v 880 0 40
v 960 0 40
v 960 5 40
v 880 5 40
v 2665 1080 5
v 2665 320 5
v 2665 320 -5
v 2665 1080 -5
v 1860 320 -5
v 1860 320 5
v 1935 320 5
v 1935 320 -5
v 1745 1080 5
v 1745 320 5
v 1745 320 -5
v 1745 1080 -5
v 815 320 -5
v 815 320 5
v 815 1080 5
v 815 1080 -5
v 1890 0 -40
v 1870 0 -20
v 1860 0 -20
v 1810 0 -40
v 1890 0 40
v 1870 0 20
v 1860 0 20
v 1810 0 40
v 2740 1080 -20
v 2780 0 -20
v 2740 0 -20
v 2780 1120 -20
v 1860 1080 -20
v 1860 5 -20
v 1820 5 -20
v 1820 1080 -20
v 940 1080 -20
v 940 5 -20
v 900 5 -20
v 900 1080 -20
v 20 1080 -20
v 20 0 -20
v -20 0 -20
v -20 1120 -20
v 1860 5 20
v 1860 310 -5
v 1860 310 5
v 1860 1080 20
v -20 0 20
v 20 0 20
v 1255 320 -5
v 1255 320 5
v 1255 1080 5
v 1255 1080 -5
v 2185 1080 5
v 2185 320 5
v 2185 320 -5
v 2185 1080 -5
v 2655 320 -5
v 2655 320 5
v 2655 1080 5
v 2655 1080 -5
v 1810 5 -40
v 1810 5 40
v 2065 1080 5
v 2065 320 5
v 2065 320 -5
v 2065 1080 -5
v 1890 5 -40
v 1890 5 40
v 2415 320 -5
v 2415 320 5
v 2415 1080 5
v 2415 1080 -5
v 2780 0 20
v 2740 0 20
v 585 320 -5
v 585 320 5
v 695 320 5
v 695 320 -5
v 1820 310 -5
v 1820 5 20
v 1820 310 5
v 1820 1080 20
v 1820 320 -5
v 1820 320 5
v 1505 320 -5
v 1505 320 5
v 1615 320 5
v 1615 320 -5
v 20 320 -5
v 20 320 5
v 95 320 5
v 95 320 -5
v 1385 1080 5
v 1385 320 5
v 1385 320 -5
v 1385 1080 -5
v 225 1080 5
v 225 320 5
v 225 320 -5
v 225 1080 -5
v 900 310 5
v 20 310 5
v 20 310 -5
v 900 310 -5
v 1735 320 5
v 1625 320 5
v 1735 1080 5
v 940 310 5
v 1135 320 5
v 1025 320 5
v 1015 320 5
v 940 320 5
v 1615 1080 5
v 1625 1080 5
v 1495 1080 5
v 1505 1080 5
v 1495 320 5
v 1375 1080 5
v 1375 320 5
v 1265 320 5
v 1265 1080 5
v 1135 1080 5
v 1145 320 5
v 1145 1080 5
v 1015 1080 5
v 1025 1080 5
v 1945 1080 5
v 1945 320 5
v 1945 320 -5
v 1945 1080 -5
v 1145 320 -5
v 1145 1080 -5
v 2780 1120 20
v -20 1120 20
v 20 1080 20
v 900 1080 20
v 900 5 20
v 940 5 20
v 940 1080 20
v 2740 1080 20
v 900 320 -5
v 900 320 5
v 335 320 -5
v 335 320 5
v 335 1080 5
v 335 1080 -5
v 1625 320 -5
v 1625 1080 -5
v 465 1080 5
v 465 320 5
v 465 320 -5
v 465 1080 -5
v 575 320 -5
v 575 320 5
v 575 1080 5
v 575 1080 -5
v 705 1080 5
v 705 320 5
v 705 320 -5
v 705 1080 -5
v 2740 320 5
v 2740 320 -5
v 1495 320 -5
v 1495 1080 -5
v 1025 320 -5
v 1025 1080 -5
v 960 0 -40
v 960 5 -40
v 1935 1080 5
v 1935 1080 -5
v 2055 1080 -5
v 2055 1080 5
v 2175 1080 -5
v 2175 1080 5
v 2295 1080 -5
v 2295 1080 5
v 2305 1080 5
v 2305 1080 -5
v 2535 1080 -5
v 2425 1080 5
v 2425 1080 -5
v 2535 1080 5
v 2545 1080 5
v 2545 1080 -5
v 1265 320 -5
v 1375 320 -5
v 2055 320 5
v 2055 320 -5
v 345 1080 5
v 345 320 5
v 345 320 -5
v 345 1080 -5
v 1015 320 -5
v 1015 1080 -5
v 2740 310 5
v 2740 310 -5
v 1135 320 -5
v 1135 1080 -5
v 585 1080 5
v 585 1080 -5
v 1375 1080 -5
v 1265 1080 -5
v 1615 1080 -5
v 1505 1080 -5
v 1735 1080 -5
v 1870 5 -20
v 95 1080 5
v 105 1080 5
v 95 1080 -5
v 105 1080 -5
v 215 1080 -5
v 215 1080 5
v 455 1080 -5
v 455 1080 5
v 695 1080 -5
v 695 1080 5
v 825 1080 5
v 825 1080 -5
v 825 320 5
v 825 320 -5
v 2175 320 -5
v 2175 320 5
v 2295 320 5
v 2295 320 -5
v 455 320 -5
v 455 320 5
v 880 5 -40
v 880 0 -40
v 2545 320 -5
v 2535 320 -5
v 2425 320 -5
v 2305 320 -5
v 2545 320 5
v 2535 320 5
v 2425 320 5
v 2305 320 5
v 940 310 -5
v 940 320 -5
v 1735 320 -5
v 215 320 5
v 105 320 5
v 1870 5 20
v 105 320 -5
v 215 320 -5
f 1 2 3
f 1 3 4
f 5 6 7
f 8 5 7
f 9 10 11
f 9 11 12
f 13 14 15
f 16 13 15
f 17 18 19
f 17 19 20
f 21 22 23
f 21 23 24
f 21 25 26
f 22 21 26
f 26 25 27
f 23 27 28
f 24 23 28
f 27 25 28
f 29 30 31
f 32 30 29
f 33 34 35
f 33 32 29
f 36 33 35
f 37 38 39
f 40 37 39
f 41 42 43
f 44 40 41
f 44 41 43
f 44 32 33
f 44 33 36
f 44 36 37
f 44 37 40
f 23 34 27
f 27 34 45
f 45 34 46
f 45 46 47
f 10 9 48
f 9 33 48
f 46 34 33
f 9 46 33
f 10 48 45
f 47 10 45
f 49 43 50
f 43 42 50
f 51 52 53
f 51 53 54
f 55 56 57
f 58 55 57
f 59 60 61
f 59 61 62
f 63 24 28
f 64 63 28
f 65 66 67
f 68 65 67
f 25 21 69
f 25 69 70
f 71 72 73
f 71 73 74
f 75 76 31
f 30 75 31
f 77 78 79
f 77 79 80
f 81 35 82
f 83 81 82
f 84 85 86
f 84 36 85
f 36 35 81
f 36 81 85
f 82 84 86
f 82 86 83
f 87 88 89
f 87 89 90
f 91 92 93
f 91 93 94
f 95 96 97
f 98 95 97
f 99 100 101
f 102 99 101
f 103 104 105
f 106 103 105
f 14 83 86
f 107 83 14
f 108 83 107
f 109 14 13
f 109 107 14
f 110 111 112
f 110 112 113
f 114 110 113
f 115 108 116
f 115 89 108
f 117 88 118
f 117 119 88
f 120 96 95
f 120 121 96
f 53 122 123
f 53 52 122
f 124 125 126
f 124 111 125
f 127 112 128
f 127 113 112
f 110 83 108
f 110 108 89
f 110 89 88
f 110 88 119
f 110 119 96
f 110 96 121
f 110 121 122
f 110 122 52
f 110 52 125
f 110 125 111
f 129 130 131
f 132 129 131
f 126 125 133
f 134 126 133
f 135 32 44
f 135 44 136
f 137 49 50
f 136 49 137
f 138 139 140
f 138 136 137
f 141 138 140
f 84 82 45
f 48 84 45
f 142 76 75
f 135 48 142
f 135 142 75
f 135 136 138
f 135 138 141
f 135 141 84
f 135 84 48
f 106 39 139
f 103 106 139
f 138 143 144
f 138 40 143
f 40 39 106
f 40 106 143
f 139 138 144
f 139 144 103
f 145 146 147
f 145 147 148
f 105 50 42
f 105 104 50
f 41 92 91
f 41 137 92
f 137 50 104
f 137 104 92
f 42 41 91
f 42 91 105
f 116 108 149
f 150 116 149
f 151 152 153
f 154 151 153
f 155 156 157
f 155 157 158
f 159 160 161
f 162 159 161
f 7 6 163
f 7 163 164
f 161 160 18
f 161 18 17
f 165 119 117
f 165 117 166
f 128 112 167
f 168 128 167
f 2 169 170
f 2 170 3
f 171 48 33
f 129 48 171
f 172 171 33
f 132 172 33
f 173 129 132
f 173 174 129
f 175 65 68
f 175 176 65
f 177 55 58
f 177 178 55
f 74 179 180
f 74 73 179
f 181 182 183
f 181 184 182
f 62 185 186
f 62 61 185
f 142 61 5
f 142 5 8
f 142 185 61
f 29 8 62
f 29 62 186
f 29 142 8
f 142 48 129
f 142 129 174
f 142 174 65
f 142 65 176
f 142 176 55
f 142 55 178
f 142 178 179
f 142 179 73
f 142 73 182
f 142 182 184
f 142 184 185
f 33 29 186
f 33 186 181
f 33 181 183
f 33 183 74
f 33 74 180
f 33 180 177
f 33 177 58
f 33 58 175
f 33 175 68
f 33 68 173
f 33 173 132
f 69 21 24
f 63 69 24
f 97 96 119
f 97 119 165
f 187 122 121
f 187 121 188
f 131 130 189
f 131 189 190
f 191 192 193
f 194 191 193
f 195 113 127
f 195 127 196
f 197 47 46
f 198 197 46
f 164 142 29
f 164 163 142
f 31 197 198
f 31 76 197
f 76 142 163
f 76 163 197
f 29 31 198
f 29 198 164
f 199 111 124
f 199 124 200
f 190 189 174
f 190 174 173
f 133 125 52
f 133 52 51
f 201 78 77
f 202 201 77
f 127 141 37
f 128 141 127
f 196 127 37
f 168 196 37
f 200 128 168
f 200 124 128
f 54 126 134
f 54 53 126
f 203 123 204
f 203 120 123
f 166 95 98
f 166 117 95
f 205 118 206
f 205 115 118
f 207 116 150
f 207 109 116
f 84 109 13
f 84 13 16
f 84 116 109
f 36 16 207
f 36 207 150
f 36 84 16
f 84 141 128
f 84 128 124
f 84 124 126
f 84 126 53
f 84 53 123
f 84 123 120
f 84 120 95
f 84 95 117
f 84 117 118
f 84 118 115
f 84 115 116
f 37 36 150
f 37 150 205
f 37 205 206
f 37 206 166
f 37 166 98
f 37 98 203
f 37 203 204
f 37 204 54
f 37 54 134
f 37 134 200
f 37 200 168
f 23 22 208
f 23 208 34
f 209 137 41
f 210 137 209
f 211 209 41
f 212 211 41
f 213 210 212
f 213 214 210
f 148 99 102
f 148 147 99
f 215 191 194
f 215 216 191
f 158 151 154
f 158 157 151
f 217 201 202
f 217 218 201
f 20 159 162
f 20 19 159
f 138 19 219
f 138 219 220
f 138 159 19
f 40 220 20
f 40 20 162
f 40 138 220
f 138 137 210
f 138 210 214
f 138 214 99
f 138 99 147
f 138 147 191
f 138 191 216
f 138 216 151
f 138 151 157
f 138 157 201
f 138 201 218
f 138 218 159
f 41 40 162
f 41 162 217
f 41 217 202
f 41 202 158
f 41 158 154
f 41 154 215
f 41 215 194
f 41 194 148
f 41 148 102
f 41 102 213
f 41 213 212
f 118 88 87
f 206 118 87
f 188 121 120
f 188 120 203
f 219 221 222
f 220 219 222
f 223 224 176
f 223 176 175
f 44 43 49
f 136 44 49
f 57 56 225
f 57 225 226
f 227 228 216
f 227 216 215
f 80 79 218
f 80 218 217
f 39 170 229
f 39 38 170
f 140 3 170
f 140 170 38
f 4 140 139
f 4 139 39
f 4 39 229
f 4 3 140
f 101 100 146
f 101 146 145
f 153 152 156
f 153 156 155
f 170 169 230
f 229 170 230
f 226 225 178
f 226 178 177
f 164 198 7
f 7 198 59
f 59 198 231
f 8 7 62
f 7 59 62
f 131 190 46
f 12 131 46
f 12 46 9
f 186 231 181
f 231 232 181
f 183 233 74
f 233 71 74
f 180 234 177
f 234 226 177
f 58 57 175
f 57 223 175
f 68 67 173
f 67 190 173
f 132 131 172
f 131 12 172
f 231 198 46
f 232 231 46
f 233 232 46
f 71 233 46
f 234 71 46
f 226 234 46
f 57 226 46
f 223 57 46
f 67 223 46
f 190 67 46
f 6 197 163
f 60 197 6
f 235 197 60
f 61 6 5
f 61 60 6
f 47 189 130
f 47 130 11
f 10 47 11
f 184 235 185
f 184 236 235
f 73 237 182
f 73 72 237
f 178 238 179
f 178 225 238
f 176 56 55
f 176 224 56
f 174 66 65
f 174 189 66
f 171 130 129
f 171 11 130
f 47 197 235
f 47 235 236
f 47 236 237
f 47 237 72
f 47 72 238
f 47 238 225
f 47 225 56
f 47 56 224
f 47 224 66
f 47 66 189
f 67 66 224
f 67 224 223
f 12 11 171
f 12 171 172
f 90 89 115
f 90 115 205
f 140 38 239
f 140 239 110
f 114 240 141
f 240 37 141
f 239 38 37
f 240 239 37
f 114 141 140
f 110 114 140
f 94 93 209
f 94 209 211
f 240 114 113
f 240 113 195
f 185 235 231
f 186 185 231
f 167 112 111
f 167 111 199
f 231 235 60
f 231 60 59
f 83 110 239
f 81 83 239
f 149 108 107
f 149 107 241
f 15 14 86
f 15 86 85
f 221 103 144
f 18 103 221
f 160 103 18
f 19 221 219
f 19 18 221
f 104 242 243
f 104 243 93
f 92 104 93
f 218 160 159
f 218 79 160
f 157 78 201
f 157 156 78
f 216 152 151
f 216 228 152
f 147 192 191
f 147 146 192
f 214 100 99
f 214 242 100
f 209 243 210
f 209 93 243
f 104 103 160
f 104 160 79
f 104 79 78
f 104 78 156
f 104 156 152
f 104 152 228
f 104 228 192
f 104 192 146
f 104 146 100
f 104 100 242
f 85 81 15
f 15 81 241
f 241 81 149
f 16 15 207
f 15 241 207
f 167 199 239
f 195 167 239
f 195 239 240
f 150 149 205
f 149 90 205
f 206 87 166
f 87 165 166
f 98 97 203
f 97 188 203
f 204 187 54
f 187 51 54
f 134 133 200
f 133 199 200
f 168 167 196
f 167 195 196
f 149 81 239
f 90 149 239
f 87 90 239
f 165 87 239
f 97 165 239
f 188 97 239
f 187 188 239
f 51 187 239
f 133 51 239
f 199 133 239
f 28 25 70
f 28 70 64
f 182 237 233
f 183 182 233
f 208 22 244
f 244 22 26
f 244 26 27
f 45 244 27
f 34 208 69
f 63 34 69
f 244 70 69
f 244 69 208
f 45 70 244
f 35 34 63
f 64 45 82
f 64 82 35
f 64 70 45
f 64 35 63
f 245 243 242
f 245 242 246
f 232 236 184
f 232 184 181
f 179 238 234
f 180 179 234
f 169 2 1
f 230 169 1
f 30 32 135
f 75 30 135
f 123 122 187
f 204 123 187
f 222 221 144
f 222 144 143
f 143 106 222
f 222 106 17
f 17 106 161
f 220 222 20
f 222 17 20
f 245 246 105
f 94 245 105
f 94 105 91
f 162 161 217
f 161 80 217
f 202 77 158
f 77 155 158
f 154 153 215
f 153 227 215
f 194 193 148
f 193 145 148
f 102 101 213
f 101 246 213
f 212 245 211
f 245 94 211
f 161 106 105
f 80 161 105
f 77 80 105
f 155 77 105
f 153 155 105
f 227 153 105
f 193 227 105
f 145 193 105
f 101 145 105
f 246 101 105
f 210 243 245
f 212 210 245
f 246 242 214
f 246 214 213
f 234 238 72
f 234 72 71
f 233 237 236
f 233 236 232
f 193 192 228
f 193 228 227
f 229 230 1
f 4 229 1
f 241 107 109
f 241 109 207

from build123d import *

# Parameters (mm, degrees)
SKETCH_2_W                           = 40
SKETCH_2_H                           = 40
SKETCH_4_W                           = 40
SKETCH_4_H                           = 40
EXTRUDE_1_DEPTH                      = 1080
EXTRUDE_2_REACH                      = 2980.657
SKETCH_5_W                           = 10
SKETCH_5_H                           = 10
SKETCH_6_W                           = 10
SKETCH_6_H                           = 10
EXTRUDE_3_DEPTH                      = 760
PATTERN_LINEAR_2_COUNT               = 4
PATTERN_LINEAR_2_PITCH               = 120
PATTERN_LINEAR_2_COL_COUNT           = 4
PATTERN_LINEAR_2_COL_PITCH           = 120
PATTERN_LINEAR_3_COUNT               = 2
PATTERN_LINEAR_3_PITCH               = 920
PATTERN_LINEAR_3_COPY_1_SKETCH_W     = 10
PATTERN_LINEAR_3_COPY_1_SKETCH_H     = 10
PATTERN_LINEAR_3_COPY_1_DEPTH        = 760
PATTERN_LINEAR_3_COPY_2_SKETCH_W     = 10
PATTERN_LINEAR_3_COPY_2_SKETCH_H     = 10
PATTERN_LINEAR_3_COPY_2_DEPTH        = 760
PATTERN_LINEAR_3_COPY_3_SKETCH_W     = 10
PATTERN_LINEAR_3_COPY_3_SKETCH_H     = 10
PATTERN_LINEAR_3_COPY_3_DEPTH        = 760
PATTERN_LINEAR_3_COPY_4_SKETCH_W     = 10
PATTERN_LINEAR_3_COPY_4_SKETCH_H     = 10
PATTERN_LINEAR_3_COPY_4_DEPTH        = 760
PATTERN_LINEAR_3_COPY_5_SKETCH_W     = 10
PATTERN_LINEAR_3_COPY_5_SKETCH_H     = 10
PATTERN_LINEAR_3_COPY_5_DEPTH        = 760
PATTERN_LINEAR_3_COPY_6_SKETCH_W     = 10
PATTERN_LINEAR_3_COPY_6_SKETCH_H     = 10
PATTERN_LINEAR_3_COPY_6_DEPTH        = 760
PATTERN_LINEAR_3_COL_COUNT           = 2
PATTERN_LINEAR_3_COL_PITCH           = 920
PATTERN_LINEAR_3_COL_COPY_1_SKETCH_W = 10
PATTERN_LINEAR_3_COL_COPY_1_SKETCH_H = 10
PATTERN_LINEAR_3_COL_COPY_1_DEPTH    = 760
PATTERN_LINEAR_3_COL_COPY_2_SKETCH_W = 10
PATTERN_LINEAR_3_COL_COPY_2_SKETCH_H = 10
PATTERN_LINEAR_3_COL_COPY_2_DEPTH    = 760
PATTERN_LINEAR_3_COL_COPY_3_SKETCH_W = 10
PATTERN_LINEAR_3_COL_COPY_3_SKETCH_H = 10
PATTERN_LINEAR_3_COL_COPY_3_DEPTH    = 760
PATTERN_LINEAR_3_COL_COPY_4_SKETCH_W = 10
PATTERN_LINEAR_3_COL_COPY_4_SKETCH_H = 10
PATTERN_LINEAR_3_COL_COPY_4_DEPTH    = 760
PATTERN_LINEAR_3_COL_COPY_5_SKETCH_W = 10
PATTERN_LINEAR_3_COL_COPY_5_SKETCH_H = 10
PATTERN_LINEAR_3_COL_COPY_5_DEPTH    = 760
PATTERN_LINEAR_3_COL_COPY_6_SKETCH_W = 10
PATTERN_LINEAR_3_COL_COPY_6_SKETCH_H = 10
PATTERN_LINEAR_3_COL_COPY_6_DEPTH    = 760
SKETCH_7_W                           = 80
SKETCH_7_H                           = 80
SKETCH_7_W_2                         = 40
SKETCH_7_H_2                         = 40
EXTRUDE_4_DEPTH                      = 5
PATTERN_LINEAR_4_COUNT               = 2
PATTERN_LINEAR_4_PITCH               = 930


with BuildPart() as part:
    # По траектории2: sweep along a curve in space
    with BuildLine() as sweep_2_path:
        Line((0, 0, 0), (0, 1100, 0))
        Line((0, 1100, 0), (2760, 1100, 0))
        Line((2760, 1100, 0), (2760, 0, 0))
    # Эскиз2 → По траектории2 (sweep)
    with BuildSketch(Plane(origin=(0, 0, 0), x_dir=(1, 0, 0), z_dir=(0, 1, 0))):
        Rectangle(SKETCH_2_W, SKETCH_2_H)
    sweep(path=sweep_2_path.line, transition=Transition.RIGHT)

    # Эскиз4 → Бобышка-Вытянуть1 (add)
    with BuildSketch(Plane.XZ.offset(-1080)):
        with Locations((920, 0)):
            Rectangle(SKETCH_4_W, SKETCH_4_H)
        with Locations((1840, 0)):
            Rectangle(SKETCH_4_W, SKETCH_4_H)
    extrude(amount=EXTRUDE_1_DEPTH)

    # Бобышка-Вытянуть2: up to this face of the body (flat: up to its plane)
    extrude_2_end = Plane(part.part.faces().sort_by_distance((2740, 540, 0))[0])
    # Эскиз5 → Бобышка-Вытянуть2 (add, up to the picked face)
    with BuildSketch(Plane(origin=(20, 0, 0), x_dir=(0, 0, -1), z_dir=(1, 0, 0)), mode=Mode.PRIVATE) as extrude_2_sk1:
        with Locations((0, 315)):
            Rectangle(SKETCH_5_W, SKETCH_5_H)
    extrude_2_tool1 = split(extrude(extrude_2_sk1.sketch, amount=EXTRUDE_2_REACH, mode=Mode.PRIVATE), bisect_by=extrude_2_end, keep=Keep.BOTH, mode=Mode.PRIVATE)
    add(extrude_2_tool1.solids().sort_by(Axis((20, 315, 0), (1, 0, 0)))[0])

    # Эскиз6 → Бобышка-Вытянуть3 (add)
    with BuildSketch(Plane(origin=(0, 320, 0), x_dir=(1, 0, 0), z_dir=(0, 1, 0))):
        with Locations((1380, 0)):
            Rectangle(SKETCH_6_W, SKETCH_6_H)
    extrude_3 = extrude(amount=EXTRUDE_3_DEPTH)

    # Линейный массив2: Бобышка-Вытянуть3 ×4
    with Locations(*[(-i * PATTERN_LINEAR_2_PITCH, 0, 0) for i in range(1, PATTERN_LINEAR_2_COUNT)]):
        add(extrude_3)

    # Линейный массив2 col: Бобышка-Вытянуть3 ×4
    with Locations(*[(i * PATTERN_LINEAR_2_COL_PITCH, 0, 0) for i in range(1, PATTERN_LINEAR_2_COL_COUNT)]):
        add(extrude_3)

    # Линейный массив3: Бобышка-Вытянуть3 ×2
    with Locations(*[(-i * PATTERN_LINEAR_3_PITCH, 0, 0) for i in range(1, PATTERN_LINEAR_3_COUNT)]):
        add(extrude_3)

    # Линейный массив3 copy 1 sketch → Линейный массив3 copy 1 (add)
    with BuildSketch(Plane(origin=(-1040, 320, 0), x_dir=(1, 0, 0), z_dir=(0, 1, 0))):
        with Locations((1380, 0)):
            Rectangle(PATTERN_LINEAR_3_COPY_1_SKETCH_W, PATTERN_LINEAR_3_COPY_1_SKETCH_H)
    extrude(amount=PATTERN_LINEAR_3_COPY_1_DEPTH)

    # Линейный массив3 copy 2 sketch → Линейный массив3 copy 2 (add)
    with BuildSketch(Plane(origin=(-1160, 320, 0), x_dir=(1, 0, 0), z_dir=(0, 1, 0))):
        with Locations((1380, 0)):
            Rectangle(PATTERN_LINEAR_3_COPY_2_SKETCH_W, PATTERN_LINEAR_3_COPY_2_SKETCH_H)
    extrude(amount=PATTERN_LINEAR_3_COPY_2_DEPTH)

    # Линейный массив3 copy 3 sketch → Линейный массив3 copy 3 (add)
    with BuildSketch(Plane(origin=(-1280, 320, 0), x_dir=(1, 0, 0), z_dir=(0, 1, 0))):
        with Locations((1380, 0)):
            Rectangle(PATTERN_LINEAR_3_COPY_3_SKETCH_W, PATTERN_LINEAR_3_COPY_3_SKETCH_H)
    extrude(amount=PATTERN_LINEAR_3_COPY_3_DEPTH)

    # Линейный массив3 copy 4 sketch → Линейный массив3 copy 4 (add)
    with BuildSketch(Plane(origin=(-800, 320, 0), x_dir=(1, 0, 0), z_dir=(0, 1, 0))):
        with Locations((1380, 0)):
            Rectangle(PATTERN_LINEAR_3_COPY_4_SKETCH_W, PATTERN_LINEAR_3_COPY_4_SKETCH_H)
    extrude(amount=PATTERN_LINEAR_3_COPY_4_DEPTH)

    # Линейный массив3 copy 5 sketch → Линейный массив3 copy 5 (add)
    with BuildSketch(Plane(origin=(-680, 320, 0), x_dir=(1, 0, 0), z_dir=(0, 1, 0))):
        with Locations((1380, 0)):
            Rectangle(PATTERN_LINEAR_3_COPY_5_SKETCH_W, PATTERN_LINEAR_3_COPY_5_SKETCH_H)
    extrude(amount=PATTERN_LINEAR_3_COPY_5_DEPTH)

    # Линейный массив3 copy 6 sketch → Линейный массив3 copy 6 (add)
    with BuildSketch(Plane(origin=(-560, 320, 0), x_dir=(1, 0, 0), z_dir=(0, 1, 0))):
        with Locations((1380, 0)):
            Rectangle(PATTERN_LINEAR_3_COPY_6_SKETCH_W, PATTERN_LINEAR_3_COPY_6_SKETCH_H)
    extrude(amount=PATTERN_LINEAR_3_COPY_6_DEPTH)

    # Линейный массив3 col: Бобышка-Вытянуть3 ×2
    with Locations(*[(i * PATTERN_LINEAR_3_COL_PITCH, 0, 0) for i in range(1, PATTERN_LINEAR_3_COL_COUNT)]):
        add(extrude_3)

    # Линейный массив3 col copy 1 sketch → Линейный массив3 col copy 1 (add)
    with BuildSketch(Plane(origin=(800, 320, 0), x_dir=(1, 0, 0), z_dir=(0, 1, 0))):
        with Locations((1380, 0)):
            Rectangle(PATTERN_LINEAR_3_COL_COPY_1_SKETCH_W, PATTERN_LINEAR_3_COL_COPY_1_SKETCH_H)
    extrude(amount=PATTERN_LINEAR_3_COL_COPY_1_DEPTH)

    # Линейный массив3 col copy 2 sketch → Линейный массив3 col copy 2 (add)
    with BuildSketch(Plane(origin=(680, 320, 0), x_dir=(1, 0, 0), z_dir=(0, 1, 0))):
        with Locations((1380, 0)):
            Rectangle(PATTERN_LINEAR_3_COL_COPY_2_SKETCH_W, PATTERN_LINEAR_3_COL_COPY_2_SKETCH_H)
    extrude(amount=PATTERN_LINEAR_3_COL_COPY_2_DEPTH)

    # Линейный массив3 col copy 3 sketch → Линейный массив3 col copy 3 (add)
    with BuildSketch(Plane(origin=(560, 320, 0), x_dir=(1, 0, 0), z_dir=(0, 1, 0))):
        with Locations((1380, 0)):
            Rectangle(PATTERN_LINEAR_3_COL_COPY_3_SKETCH_W, PATTERN_LINEAR_3_COL_COPY_3_SKETCH_H)
    extrude(amount=PATTERN_LINEAR_3_COL_COPY_3_DEPTH)

    # Линейный массив3 col copy 4 sketch → Линейный массив3 col copy 4 (add)
    with BuildSketch(Plane(origin=(1040, 320, 0), x_dir=(1, 0, 0), z_dir=(0, 1, 0))):
        with Locations((1380, 0)):
            Rectangle(PATTERN_LINEAR_3_COL_COPY_4_SKETCH_W, PATTERN_LINEAR_3_COL_COPY_4_SKETCH_H)
    extrude(amount=PATTERN_LINEAR_3_COL_COPY_4_DEPTH)

    # Линейный массив3 col copy 5 sketch → Линейный массив3 col copy 5 (add)
    with BuildSketch(Plane(origin=(1160, 320, 0), x_dir=(1, 0, 0), z_dir=(0, 1, 0))):
        with Locations((1380, 0)):
            Rectangle(PATTERN_LINEAR_3_COL_COPY_5_SKETCH_W, PATTERN_LINEAR_3_COL_COPY_5_SKETCH_H)
    extrude(amount=PATTERN_LINEAR_3_COL_COPY_5_DEPTH)

    # Линейный массив3 col copy 6 sketch → Линейный массив3 col copy 6 (add)
    with BuildSketch(Plane(origin=(1280, 320, 0), x_dir=(1, 0, 0), z_dir=(0, 1, 0))):
        with Locations((1380, 0)):
            Rectangle(PATTERN_LINEAR_3_COL_COPY_6_SKETCH_W, PATTERN_LINEAR_3_COL_COPY_6_SKETCH_H)
    extrude(amount=PATTERN_LINEAR_3_COL_COPY_6_DEPTH)

    # Эскиз7 → Бобышка-Вытянуть4 (add)
    with BuildSketch(Plane(origin=(0, 0, 0), x_dir=(-1, 0, 0), z_dir=(0, 1, 0))):
        with Locations((-920, 0)):
            Rectangle(SKETCH_7_W, SKETCH_7_H)
        with Locations((-920, 0)):
            Rectangle(SKETCH_7_W_2, SKETCH_7_H_2, mode=Mode.SUBTRACT)
    extrude_4 = extrude(amount=EXTRUDE_4_DEPTH)

    # Линейный массив4: Бобышка-Вытянуть4 ×2
    with Locations(*[(i * PATTERN_LINEAR_4_PITCH, 0, 0) for i in range(1, PATTERN_LINEAR_4_COUNT)]):
        add(extrude_4)


solid = part.part
